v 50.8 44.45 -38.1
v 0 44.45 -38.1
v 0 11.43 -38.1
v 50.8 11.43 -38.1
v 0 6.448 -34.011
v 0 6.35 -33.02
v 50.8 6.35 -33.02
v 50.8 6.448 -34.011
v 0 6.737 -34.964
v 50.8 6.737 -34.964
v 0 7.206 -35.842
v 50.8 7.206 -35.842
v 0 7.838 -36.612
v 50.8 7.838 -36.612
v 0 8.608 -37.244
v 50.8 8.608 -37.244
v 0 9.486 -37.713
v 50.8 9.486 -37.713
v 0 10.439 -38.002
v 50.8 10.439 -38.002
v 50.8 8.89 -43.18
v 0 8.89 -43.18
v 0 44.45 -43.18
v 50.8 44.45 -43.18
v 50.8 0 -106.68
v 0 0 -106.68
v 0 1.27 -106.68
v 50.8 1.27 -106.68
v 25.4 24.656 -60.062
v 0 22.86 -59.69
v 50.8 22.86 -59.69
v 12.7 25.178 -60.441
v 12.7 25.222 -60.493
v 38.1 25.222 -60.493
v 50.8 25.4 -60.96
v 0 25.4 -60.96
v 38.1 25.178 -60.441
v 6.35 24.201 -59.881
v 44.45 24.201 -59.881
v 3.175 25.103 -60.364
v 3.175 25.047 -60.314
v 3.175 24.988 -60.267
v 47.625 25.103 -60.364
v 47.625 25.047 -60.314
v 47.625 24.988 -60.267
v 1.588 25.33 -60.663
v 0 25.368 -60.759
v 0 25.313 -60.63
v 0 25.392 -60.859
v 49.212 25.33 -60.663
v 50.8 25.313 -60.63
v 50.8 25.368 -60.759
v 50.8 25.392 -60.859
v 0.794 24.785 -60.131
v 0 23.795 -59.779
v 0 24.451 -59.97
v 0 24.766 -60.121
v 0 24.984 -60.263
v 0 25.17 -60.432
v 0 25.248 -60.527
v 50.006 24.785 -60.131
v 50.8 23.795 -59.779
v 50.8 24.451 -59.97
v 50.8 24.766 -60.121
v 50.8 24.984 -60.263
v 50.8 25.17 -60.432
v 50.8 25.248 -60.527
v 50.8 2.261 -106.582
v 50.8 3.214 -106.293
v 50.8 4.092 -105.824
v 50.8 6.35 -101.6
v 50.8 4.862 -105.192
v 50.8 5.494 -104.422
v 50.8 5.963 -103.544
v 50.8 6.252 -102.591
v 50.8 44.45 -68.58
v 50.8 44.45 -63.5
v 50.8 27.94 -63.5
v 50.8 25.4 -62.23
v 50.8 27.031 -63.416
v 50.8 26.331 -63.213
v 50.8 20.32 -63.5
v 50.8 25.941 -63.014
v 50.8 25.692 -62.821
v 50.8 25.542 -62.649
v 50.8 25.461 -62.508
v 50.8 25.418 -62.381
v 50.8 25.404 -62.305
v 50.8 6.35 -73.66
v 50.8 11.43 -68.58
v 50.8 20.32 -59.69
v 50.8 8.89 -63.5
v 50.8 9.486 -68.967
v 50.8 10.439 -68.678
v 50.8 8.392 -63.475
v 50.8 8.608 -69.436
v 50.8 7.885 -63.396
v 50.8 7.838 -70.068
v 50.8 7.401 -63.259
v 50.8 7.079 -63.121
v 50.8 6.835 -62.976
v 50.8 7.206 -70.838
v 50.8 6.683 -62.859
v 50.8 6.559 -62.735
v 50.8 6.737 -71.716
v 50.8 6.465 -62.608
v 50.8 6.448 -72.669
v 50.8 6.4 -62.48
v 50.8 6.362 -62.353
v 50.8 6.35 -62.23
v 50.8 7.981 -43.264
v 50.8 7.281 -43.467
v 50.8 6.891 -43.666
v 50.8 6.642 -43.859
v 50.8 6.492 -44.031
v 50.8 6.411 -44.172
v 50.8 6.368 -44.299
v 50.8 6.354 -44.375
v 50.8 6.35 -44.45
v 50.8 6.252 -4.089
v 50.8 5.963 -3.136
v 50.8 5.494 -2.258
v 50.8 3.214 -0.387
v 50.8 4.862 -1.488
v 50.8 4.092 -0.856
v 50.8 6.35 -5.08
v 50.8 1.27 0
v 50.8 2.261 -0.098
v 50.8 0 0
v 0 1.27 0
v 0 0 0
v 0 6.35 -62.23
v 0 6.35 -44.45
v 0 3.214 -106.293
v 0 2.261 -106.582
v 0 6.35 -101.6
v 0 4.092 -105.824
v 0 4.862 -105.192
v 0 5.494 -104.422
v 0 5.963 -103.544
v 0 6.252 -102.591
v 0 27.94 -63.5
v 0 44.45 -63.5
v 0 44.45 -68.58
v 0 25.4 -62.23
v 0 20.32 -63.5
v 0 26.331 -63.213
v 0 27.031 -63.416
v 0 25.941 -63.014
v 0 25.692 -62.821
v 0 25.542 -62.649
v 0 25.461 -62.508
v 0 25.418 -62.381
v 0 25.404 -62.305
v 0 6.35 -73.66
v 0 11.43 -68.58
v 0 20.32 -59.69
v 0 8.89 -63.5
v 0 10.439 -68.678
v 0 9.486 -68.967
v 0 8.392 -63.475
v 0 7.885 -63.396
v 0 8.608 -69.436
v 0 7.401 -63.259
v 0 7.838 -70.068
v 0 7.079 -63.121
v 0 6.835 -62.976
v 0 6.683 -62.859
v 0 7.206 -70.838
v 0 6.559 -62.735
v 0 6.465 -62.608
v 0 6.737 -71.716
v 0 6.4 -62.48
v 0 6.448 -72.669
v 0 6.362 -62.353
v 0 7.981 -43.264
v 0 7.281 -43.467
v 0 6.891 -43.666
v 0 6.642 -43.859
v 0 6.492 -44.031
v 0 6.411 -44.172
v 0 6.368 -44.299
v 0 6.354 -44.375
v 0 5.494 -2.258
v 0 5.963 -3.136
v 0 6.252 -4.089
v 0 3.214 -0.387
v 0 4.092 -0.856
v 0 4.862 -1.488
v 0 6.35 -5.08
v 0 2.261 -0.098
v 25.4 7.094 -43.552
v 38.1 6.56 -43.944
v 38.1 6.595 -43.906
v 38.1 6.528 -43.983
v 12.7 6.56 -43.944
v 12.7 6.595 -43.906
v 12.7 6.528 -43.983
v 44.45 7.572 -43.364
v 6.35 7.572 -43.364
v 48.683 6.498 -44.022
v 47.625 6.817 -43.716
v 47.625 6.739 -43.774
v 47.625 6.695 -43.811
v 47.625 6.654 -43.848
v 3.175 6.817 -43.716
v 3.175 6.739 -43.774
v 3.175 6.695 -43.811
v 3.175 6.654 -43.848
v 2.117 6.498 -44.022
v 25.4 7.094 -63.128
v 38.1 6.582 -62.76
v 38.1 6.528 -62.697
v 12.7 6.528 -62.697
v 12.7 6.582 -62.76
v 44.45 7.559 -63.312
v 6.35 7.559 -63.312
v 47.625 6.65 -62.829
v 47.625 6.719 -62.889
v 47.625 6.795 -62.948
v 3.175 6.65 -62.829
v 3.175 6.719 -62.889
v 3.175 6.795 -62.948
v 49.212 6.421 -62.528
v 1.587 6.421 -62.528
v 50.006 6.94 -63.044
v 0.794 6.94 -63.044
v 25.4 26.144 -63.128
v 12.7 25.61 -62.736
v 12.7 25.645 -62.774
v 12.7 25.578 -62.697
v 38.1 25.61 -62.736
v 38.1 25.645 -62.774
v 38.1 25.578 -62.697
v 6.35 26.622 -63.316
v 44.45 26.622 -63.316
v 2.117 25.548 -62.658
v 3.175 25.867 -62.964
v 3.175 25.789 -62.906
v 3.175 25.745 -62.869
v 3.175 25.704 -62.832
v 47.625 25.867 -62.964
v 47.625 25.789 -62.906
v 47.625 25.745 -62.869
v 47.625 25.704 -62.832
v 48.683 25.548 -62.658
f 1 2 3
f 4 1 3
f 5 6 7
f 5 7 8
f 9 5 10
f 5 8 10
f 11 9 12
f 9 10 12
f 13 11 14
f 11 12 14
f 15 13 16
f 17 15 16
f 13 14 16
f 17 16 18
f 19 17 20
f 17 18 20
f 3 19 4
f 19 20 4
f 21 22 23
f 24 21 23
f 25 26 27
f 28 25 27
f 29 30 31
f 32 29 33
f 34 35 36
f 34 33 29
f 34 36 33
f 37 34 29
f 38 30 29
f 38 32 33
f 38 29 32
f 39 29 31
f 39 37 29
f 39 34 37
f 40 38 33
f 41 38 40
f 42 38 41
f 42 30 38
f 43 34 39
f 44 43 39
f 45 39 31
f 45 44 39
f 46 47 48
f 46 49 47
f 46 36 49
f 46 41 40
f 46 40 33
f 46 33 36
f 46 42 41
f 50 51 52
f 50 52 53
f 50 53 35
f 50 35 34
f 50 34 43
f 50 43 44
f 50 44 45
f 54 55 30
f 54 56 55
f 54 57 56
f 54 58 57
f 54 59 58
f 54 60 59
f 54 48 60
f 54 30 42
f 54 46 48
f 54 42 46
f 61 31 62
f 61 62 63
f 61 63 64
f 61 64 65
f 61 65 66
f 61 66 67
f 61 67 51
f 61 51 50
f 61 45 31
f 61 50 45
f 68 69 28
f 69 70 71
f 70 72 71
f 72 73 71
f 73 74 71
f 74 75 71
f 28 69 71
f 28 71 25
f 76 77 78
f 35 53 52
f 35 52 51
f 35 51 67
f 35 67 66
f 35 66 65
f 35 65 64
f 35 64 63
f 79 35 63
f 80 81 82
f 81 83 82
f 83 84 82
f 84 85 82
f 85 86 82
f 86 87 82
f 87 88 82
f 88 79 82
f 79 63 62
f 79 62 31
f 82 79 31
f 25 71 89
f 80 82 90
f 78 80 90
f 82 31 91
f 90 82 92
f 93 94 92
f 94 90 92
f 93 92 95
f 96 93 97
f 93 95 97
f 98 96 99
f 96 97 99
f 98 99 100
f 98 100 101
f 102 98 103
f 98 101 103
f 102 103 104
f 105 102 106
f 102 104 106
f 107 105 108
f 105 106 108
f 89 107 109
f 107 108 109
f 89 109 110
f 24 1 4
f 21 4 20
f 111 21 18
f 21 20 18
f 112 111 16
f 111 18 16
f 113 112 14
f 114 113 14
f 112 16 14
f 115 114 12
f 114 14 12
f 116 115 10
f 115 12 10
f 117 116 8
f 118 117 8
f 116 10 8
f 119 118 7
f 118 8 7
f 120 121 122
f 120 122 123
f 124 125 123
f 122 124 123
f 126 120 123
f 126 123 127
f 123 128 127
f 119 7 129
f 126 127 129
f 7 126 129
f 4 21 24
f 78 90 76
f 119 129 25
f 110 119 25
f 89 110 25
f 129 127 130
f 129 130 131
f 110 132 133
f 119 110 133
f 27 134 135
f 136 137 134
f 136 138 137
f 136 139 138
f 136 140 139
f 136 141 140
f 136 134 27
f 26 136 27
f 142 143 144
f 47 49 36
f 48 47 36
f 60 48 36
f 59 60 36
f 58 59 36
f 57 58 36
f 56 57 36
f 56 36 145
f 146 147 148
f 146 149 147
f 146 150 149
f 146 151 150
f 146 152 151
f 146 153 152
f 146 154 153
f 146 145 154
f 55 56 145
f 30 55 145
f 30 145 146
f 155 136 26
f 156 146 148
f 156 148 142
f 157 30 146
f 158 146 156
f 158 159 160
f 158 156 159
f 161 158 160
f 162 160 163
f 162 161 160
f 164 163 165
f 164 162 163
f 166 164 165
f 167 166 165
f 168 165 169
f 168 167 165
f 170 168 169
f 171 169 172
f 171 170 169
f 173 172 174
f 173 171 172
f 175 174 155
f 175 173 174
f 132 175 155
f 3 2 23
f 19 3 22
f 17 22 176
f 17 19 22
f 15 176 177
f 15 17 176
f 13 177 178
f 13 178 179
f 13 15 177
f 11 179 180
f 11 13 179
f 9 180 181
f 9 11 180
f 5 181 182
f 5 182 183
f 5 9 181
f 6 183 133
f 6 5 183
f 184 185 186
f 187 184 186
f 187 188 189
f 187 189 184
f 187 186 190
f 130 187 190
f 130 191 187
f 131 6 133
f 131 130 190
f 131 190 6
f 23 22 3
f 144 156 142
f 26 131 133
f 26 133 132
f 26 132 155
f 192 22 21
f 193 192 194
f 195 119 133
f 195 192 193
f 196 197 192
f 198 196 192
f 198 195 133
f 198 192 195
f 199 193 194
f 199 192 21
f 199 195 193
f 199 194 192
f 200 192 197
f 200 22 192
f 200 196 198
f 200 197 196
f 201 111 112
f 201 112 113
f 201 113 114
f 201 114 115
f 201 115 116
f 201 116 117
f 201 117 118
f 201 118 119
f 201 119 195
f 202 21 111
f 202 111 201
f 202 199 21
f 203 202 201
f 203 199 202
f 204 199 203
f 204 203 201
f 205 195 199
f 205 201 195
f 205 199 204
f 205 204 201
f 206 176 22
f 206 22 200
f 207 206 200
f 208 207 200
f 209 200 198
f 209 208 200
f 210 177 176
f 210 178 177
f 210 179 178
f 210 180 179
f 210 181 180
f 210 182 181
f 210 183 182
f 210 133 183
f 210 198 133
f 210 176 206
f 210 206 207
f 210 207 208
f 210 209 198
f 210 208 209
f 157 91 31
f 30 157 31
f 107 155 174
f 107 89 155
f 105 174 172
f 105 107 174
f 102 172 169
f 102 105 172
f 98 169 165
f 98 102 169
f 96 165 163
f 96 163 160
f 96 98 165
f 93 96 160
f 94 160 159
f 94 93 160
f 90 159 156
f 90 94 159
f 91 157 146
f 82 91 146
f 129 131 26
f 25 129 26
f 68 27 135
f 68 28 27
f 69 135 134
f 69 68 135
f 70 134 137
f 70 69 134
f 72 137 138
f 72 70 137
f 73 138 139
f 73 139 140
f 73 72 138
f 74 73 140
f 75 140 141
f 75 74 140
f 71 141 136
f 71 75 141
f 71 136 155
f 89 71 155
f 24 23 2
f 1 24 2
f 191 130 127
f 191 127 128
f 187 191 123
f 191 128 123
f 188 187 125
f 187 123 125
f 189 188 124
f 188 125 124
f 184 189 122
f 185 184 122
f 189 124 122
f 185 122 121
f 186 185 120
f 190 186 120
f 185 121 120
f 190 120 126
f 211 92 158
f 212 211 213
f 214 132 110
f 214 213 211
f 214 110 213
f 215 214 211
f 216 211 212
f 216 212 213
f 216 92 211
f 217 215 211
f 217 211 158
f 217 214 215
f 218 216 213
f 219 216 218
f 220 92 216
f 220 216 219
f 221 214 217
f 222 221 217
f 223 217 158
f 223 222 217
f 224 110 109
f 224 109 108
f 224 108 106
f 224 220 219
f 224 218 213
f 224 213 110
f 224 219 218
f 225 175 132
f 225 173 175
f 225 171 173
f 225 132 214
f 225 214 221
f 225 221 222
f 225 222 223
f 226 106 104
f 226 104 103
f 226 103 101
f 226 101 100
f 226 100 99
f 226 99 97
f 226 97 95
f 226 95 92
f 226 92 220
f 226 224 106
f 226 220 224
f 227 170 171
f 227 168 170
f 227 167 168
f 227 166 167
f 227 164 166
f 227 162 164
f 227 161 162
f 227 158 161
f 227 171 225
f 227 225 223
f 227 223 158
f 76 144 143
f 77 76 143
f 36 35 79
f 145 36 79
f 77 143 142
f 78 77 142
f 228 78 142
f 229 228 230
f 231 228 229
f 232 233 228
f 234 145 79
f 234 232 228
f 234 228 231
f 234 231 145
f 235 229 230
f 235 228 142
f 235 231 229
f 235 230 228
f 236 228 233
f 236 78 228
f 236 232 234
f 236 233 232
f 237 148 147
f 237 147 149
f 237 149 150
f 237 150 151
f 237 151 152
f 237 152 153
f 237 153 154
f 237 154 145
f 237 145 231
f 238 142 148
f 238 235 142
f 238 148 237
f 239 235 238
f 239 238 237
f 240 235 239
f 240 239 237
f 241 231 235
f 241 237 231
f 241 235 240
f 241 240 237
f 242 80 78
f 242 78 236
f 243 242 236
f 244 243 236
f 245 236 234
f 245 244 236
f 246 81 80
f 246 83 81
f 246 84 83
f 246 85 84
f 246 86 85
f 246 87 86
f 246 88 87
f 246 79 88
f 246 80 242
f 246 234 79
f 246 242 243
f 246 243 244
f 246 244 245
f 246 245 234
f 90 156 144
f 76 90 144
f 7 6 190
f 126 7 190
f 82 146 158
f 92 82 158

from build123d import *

# Parameters (mm, degrees)
BOSS_EXTRUDE1_DEPTH = 50.8
SKETCH4_W           = 3.81
SKETCH4_H           = 5.08
BOSS_EXTRUDE5_DEPTH = 50.8
FILLET1_R           = 5.08
FILLET2_SIZE        = 1.27
FILLET2_SIZE_2      = 2.54


with BuildPart() as part:
    # Sketch1 → Boss-Extrude1 (new body)
    with BuildSketch(Plane(origin=(0, 0, 0), x_dir=(0, 0, -1), z_dir=(1, 0, 0))):
        Polygon((0, 0), (106.68, 0), (106.68, 6.35), (68.58, 6.35), (68.58, 44.45), (63.5, 44.45), (63.5, 6.35), (43.18, 6.35), (43.18, 44.45), (38.1, 44.45), (38.1, 6.35), (0, 6.35), align=None)
    extrude(amount=BOSS_EXTRUDE1_DEPTH)

    # Sketch4 → Boss-Extrude5 (add)
    with BuildSketch(Plane(origin=(50.8, 0, 0), x_dir=(0, 0, -1), z_dir=(1, 0, 0))):
        with Locations((61.595, 22.86)):
            Rectangle(SKETCH4_W, SKETCH4_H)
    extrude(amount=-BOSS_EXTRUDE5_DEPTH)

    # Fillet1
    fillet1_edges = [part.edges().sort_by_distance(p)[0] for p in [
        (25.4, 6.35, 0),
        (25.4, 6.35, -38.1),
        (25.4, 6.35, -68.58),
        (25.4, 6.35, -106.68),
    ]]
    fillet(fillet1_edges, radius=FILLET1_R)

    # Fillet2
    # an asymmetric fillet: 2.54, 1.27 mm, written as the material it adds along each edge
    with BuildSketch(Plane(origin=(0, 6.35, -63.5), x_dir=(0, 0, 1), z_dir=(1, 0, 0))) as fillet2_piece_1:
        with BuildLine():
            Bezier((FILLET2_SIZE, 0), (0, 0), (0, -FILLET2_SIZE_2), weights=[1, 0.707106781, 1])
            Line((0, -FILLET2_SIZE_2), (0, 0))
            Line((0, 0), (FILLET2_SIZE, 0))
        make_face()
    extrude(amount=50.8)
    with BuildSketch(Plane(origin=(0, 6.35, -43.18), x_dir=(0, 1, 0), z_dir=(1, 0, 0)), Plane(origin=(50.8, 25.4, -63.5), x_dir=(0, 1, 0), z_dir=(-1, 0, 0))) as fillet2_piece_2:
        with BuildLine():
            Bezier((FILLET2_SIZE_2, 0), (0, 0), (0, -FILLET2_SIZE), weights=[1, 0.707106781, 1])
            Line((0, -FILLET2_SIZE), (0, 0))
            Line((0, 0), (FILLET2_SIZE_2, 0))
        make_face()
    extrude(amount=50.8)
    # an asymmetric fillet: 2.54, 1.27 mm, written as the material it takes off along each edge
    with BuildSketch(Plane(origin=(57.15, 25.4, -59.69), x_dir=(0, 0, -1), z_dir=(-1, 0, 0))) as fillet2_2_piece_1:
        with BuildLine():
            Bezier((FILLET2_SIZE, 0), (0, 0), (0, FILLET2_SIZE_2), weights=[1, 0.707106781, 1])
            Line((0, FILLET2_SIZE_2), (0, 0))
            Line((0, 0), (FILLET2_SIZE, 0))
        make_face()
    extrude(amount=63.5, mode=Mode.SUBTRACT)


solid = part.part
